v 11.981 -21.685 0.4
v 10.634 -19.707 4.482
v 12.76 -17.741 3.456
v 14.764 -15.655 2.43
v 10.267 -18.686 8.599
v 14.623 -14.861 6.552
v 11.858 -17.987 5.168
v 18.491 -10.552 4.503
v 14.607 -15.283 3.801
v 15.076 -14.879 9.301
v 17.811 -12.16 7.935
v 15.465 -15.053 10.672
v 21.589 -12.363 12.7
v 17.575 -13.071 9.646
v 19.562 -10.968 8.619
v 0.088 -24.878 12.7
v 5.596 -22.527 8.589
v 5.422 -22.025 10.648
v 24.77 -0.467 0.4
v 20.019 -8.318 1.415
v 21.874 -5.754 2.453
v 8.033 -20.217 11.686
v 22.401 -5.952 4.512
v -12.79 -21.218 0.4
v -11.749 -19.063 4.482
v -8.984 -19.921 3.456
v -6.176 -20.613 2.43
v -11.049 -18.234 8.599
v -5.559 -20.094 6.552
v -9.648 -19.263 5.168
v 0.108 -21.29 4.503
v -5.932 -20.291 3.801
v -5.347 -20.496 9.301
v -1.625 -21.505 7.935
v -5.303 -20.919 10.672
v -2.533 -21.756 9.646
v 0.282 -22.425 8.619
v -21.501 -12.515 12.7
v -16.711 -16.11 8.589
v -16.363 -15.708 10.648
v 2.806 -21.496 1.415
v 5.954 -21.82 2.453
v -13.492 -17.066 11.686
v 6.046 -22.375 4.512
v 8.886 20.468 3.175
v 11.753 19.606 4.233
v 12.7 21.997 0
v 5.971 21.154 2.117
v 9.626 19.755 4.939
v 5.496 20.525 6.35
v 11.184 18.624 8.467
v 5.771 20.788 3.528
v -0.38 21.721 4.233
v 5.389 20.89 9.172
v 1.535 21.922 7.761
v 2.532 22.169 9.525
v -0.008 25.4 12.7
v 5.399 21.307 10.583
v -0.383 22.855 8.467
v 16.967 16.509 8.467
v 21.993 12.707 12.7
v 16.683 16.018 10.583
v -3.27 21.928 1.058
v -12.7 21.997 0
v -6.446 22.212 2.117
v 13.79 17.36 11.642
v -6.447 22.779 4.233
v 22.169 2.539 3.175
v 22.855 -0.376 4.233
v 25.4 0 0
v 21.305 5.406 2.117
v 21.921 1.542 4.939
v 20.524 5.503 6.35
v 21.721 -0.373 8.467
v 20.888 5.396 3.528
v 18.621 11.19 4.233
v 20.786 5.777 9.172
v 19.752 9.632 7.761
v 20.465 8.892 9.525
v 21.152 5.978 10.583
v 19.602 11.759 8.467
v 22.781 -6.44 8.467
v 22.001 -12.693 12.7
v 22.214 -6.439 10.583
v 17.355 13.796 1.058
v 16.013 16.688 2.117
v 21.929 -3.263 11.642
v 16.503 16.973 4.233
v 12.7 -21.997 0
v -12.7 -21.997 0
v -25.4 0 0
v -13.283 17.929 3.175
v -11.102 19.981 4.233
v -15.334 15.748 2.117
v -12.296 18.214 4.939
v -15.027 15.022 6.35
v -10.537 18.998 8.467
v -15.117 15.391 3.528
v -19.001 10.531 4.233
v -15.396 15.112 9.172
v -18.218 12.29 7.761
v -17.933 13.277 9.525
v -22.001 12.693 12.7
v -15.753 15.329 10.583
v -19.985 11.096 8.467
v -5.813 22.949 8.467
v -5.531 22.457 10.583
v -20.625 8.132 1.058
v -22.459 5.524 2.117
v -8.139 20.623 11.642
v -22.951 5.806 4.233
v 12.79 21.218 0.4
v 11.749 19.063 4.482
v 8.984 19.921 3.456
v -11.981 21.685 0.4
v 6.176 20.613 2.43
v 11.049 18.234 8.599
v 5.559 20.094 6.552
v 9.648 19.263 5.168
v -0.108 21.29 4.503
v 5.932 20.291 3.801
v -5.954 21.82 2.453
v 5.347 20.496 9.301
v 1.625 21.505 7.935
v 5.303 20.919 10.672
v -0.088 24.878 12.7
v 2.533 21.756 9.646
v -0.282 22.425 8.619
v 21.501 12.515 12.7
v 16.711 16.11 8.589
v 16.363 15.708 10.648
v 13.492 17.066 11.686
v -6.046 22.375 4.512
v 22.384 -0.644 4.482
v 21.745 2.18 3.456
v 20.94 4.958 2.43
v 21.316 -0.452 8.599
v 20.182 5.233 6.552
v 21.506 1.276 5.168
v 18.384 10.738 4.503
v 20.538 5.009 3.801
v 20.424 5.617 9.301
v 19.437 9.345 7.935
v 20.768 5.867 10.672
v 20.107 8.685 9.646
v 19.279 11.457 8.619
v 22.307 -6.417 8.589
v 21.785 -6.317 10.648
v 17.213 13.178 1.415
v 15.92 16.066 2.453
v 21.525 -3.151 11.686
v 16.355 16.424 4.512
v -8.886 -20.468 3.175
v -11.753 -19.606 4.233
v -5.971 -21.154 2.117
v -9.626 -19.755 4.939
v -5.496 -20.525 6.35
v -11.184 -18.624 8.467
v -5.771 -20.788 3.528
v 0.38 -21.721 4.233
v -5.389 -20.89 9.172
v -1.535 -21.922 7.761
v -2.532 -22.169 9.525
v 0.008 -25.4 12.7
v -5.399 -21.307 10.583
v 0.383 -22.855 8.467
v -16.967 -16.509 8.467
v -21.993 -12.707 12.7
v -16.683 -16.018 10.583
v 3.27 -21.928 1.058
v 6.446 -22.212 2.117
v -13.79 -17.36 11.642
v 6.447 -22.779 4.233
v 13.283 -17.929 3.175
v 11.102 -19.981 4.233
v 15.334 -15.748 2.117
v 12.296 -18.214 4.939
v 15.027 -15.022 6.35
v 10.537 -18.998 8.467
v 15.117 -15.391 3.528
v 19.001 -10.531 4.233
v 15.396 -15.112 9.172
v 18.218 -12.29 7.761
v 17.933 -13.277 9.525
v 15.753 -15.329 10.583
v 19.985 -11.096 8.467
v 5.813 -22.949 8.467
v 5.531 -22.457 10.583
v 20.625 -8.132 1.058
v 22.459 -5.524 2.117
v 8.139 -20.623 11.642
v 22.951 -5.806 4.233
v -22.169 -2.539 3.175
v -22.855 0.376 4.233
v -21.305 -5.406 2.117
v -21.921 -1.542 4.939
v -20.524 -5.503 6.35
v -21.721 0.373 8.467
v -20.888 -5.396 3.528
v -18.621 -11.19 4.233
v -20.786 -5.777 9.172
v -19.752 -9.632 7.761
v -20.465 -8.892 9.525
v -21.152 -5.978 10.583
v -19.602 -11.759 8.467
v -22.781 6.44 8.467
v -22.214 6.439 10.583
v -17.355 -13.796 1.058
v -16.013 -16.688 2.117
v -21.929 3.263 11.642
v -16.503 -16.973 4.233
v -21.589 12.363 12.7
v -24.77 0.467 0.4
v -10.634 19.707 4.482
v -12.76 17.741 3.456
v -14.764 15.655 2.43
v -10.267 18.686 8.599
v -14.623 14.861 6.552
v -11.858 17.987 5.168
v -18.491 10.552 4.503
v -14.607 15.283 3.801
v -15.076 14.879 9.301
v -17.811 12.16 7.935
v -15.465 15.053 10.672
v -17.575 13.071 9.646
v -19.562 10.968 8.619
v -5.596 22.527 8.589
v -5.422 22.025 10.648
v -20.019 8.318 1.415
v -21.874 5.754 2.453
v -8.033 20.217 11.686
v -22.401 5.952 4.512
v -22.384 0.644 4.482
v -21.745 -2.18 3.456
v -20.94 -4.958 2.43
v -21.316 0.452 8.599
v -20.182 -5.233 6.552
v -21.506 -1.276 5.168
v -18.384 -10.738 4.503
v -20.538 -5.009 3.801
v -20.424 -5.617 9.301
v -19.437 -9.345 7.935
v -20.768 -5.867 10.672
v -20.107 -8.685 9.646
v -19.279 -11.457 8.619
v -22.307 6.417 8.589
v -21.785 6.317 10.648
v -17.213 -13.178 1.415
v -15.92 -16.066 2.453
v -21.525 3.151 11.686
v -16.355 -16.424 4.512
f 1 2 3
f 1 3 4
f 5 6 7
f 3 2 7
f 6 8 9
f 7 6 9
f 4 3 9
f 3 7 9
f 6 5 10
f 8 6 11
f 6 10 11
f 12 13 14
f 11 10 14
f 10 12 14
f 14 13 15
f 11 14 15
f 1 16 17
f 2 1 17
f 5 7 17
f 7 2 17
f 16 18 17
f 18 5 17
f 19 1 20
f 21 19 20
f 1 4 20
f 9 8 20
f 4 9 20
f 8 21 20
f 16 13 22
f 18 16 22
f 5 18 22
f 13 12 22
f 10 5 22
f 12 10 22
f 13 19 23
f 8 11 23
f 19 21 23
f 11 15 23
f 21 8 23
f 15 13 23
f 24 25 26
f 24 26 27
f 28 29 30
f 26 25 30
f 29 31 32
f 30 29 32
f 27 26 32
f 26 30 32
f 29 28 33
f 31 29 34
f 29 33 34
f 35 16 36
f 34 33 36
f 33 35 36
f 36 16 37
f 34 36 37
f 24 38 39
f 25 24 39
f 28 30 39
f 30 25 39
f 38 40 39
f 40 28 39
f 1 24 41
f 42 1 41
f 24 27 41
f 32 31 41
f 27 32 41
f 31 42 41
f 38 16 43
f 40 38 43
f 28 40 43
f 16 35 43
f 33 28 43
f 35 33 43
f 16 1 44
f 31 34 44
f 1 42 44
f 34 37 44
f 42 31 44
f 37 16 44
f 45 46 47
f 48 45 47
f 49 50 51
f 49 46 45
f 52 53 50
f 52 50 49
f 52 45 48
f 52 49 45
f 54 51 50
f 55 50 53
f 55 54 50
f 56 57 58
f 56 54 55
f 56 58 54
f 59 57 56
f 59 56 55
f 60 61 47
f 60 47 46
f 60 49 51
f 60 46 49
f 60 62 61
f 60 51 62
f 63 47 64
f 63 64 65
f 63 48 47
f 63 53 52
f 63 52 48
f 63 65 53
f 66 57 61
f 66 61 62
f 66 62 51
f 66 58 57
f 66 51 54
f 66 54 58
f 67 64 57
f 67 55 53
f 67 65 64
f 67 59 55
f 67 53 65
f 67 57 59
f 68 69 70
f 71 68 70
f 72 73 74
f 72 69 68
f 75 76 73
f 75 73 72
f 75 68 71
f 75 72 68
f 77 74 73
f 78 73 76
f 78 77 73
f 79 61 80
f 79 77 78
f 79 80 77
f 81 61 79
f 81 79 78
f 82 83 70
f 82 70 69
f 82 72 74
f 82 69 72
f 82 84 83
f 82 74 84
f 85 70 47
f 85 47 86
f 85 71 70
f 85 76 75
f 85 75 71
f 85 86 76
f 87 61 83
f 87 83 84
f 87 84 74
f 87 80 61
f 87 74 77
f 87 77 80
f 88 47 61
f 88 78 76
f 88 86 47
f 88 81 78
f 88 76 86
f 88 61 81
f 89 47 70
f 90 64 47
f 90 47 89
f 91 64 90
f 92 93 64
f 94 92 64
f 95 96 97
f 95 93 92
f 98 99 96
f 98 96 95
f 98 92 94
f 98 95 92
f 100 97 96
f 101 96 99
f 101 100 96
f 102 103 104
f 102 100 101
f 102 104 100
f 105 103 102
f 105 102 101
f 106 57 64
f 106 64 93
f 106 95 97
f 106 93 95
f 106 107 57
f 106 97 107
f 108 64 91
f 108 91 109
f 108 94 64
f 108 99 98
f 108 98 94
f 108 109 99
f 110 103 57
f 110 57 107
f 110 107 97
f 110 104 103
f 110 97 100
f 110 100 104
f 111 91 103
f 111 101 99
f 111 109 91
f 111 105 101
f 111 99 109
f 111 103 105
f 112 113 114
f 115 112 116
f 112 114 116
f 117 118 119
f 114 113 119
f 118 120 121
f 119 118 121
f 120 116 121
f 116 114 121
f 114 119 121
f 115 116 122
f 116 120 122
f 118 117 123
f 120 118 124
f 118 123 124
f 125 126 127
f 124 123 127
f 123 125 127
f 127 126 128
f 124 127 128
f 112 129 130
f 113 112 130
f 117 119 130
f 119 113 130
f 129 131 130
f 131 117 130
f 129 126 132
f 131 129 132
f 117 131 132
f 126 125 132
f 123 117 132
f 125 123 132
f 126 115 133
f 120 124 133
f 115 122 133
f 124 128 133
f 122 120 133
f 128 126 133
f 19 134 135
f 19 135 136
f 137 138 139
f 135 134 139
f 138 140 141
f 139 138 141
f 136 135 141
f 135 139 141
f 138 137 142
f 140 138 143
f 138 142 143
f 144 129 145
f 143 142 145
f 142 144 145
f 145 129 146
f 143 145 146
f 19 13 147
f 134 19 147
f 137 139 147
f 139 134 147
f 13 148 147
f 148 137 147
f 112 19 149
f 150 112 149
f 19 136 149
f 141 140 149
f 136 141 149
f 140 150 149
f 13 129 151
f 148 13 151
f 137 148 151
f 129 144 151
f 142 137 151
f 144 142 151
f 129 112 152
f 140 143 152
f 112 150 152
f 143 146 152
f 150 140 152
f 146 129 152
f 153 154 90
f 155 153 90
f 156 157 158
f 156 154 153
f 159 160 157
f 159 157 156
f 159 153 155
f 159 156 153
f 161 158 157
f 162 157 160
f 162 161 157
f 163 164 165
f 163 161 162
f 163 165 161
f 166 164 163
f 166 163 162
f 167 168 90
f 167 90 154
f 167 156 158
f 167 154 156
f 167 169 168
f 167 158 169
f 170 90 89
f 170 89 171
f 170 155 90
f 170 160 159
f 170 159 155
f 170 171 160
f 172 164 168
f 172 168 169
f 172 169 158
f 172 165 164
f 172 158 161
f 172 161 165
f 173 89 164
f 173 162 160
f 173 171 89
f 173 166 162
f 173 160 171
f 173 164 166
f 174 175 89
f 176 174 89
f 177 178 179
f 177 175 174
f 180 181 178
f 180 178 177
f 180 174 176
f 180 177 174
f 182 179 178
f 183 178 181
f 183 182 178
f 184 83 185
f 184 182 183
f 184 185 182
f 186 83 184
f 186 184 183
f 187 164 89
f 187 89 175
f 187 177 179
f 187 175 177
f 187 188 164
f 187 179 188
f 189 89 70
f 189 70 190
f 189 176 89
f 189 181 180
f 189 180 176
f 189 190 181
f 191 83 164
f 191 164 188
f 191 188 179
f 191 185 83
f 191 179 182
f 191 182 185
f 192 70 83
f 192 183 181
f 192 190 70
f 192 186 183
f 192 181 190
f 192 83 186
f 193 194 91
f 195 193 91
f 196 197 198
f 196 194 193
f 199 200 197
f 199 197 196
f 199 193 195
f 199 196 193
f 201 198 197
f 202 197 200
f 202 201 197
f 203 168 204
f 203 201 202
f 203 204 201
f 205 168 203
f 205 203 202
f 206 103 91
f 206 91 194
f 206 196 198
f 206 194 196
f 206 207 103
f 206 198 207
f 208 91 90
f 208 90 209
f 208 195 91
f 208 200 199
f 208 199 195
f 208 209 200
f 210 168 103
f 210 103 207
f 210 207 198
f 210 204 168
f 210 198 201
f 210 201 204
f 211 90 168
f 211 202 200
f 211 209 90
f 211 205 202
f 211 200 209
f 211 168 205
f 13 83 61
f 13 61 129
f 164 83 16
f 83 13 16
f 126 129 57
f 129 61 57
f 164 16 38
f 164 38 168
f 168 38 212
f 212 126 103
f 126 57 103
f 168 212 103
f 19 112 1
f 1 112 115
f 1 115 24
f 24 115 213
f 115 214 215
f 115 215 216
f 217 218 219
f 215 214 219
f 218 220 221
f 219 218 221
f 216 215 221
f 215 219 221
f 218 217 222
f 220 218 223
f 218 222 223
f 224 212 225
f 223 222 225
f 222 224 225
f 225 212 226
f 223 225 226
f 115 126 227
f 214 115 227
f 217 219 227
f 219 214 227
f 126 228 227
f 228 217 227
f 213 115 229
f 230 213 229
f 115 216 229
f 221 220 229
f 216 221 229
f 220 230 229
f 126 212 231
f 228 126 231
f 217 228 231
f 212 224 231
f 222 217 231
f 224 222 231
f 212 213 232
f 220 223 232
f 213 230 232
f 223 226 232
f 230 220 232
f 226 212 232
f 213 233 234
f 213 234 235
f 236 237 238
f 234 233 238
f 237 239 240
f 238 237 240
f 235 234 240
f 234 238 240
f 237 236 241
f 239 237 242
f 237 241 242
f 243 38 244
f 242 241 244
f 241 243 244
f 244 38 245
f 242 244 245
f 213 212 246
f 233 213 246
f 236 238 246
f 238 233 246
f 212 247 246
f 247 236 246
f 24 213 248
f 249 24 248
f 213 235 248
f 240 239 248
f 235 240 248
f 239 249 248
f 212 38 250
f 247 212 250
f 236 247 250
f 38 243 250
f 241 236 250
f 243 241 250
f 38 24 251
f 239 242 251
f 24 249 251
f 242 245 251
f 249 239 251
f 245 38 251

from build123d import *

# Parameters (mm, degrees)
F4_T = -0.4


with BuildPart() as f3:
    # F0 (on Top) → F3 section 0
    with BuildSketch(Plane.XY):
        Polygon((12.7, 21.9970452561), (-12.7, 21.9970452561), (-25.4, 0), (-12.7, -21.9970452561), (12.7, -21.9970452561), (25.4, 0), align=None)
    # F2 (on offset) → F3 section 1
    with BuildSketch(Plane.XY.offset(12.7)):
        Polygon((-0.0081428164, 25.3999986948), (-22.001115534, 12.6929474615), (-21.9929727176, -12.7070512333), (0.0081428164, -25.3999986948), (22.001115534, -12.6929474615), (21.9929727176, 12.7070512333), align=None)
    loft()

    # F4
    f4_openings = [f3.faces().sort_by_distance(p)[0] for p in [
        (0, 0, 12.7),
    ]]
    offset(amount=F4_T, openings=f4_openings, kind=Kind.INTERSECTION)


solid = f3.part
